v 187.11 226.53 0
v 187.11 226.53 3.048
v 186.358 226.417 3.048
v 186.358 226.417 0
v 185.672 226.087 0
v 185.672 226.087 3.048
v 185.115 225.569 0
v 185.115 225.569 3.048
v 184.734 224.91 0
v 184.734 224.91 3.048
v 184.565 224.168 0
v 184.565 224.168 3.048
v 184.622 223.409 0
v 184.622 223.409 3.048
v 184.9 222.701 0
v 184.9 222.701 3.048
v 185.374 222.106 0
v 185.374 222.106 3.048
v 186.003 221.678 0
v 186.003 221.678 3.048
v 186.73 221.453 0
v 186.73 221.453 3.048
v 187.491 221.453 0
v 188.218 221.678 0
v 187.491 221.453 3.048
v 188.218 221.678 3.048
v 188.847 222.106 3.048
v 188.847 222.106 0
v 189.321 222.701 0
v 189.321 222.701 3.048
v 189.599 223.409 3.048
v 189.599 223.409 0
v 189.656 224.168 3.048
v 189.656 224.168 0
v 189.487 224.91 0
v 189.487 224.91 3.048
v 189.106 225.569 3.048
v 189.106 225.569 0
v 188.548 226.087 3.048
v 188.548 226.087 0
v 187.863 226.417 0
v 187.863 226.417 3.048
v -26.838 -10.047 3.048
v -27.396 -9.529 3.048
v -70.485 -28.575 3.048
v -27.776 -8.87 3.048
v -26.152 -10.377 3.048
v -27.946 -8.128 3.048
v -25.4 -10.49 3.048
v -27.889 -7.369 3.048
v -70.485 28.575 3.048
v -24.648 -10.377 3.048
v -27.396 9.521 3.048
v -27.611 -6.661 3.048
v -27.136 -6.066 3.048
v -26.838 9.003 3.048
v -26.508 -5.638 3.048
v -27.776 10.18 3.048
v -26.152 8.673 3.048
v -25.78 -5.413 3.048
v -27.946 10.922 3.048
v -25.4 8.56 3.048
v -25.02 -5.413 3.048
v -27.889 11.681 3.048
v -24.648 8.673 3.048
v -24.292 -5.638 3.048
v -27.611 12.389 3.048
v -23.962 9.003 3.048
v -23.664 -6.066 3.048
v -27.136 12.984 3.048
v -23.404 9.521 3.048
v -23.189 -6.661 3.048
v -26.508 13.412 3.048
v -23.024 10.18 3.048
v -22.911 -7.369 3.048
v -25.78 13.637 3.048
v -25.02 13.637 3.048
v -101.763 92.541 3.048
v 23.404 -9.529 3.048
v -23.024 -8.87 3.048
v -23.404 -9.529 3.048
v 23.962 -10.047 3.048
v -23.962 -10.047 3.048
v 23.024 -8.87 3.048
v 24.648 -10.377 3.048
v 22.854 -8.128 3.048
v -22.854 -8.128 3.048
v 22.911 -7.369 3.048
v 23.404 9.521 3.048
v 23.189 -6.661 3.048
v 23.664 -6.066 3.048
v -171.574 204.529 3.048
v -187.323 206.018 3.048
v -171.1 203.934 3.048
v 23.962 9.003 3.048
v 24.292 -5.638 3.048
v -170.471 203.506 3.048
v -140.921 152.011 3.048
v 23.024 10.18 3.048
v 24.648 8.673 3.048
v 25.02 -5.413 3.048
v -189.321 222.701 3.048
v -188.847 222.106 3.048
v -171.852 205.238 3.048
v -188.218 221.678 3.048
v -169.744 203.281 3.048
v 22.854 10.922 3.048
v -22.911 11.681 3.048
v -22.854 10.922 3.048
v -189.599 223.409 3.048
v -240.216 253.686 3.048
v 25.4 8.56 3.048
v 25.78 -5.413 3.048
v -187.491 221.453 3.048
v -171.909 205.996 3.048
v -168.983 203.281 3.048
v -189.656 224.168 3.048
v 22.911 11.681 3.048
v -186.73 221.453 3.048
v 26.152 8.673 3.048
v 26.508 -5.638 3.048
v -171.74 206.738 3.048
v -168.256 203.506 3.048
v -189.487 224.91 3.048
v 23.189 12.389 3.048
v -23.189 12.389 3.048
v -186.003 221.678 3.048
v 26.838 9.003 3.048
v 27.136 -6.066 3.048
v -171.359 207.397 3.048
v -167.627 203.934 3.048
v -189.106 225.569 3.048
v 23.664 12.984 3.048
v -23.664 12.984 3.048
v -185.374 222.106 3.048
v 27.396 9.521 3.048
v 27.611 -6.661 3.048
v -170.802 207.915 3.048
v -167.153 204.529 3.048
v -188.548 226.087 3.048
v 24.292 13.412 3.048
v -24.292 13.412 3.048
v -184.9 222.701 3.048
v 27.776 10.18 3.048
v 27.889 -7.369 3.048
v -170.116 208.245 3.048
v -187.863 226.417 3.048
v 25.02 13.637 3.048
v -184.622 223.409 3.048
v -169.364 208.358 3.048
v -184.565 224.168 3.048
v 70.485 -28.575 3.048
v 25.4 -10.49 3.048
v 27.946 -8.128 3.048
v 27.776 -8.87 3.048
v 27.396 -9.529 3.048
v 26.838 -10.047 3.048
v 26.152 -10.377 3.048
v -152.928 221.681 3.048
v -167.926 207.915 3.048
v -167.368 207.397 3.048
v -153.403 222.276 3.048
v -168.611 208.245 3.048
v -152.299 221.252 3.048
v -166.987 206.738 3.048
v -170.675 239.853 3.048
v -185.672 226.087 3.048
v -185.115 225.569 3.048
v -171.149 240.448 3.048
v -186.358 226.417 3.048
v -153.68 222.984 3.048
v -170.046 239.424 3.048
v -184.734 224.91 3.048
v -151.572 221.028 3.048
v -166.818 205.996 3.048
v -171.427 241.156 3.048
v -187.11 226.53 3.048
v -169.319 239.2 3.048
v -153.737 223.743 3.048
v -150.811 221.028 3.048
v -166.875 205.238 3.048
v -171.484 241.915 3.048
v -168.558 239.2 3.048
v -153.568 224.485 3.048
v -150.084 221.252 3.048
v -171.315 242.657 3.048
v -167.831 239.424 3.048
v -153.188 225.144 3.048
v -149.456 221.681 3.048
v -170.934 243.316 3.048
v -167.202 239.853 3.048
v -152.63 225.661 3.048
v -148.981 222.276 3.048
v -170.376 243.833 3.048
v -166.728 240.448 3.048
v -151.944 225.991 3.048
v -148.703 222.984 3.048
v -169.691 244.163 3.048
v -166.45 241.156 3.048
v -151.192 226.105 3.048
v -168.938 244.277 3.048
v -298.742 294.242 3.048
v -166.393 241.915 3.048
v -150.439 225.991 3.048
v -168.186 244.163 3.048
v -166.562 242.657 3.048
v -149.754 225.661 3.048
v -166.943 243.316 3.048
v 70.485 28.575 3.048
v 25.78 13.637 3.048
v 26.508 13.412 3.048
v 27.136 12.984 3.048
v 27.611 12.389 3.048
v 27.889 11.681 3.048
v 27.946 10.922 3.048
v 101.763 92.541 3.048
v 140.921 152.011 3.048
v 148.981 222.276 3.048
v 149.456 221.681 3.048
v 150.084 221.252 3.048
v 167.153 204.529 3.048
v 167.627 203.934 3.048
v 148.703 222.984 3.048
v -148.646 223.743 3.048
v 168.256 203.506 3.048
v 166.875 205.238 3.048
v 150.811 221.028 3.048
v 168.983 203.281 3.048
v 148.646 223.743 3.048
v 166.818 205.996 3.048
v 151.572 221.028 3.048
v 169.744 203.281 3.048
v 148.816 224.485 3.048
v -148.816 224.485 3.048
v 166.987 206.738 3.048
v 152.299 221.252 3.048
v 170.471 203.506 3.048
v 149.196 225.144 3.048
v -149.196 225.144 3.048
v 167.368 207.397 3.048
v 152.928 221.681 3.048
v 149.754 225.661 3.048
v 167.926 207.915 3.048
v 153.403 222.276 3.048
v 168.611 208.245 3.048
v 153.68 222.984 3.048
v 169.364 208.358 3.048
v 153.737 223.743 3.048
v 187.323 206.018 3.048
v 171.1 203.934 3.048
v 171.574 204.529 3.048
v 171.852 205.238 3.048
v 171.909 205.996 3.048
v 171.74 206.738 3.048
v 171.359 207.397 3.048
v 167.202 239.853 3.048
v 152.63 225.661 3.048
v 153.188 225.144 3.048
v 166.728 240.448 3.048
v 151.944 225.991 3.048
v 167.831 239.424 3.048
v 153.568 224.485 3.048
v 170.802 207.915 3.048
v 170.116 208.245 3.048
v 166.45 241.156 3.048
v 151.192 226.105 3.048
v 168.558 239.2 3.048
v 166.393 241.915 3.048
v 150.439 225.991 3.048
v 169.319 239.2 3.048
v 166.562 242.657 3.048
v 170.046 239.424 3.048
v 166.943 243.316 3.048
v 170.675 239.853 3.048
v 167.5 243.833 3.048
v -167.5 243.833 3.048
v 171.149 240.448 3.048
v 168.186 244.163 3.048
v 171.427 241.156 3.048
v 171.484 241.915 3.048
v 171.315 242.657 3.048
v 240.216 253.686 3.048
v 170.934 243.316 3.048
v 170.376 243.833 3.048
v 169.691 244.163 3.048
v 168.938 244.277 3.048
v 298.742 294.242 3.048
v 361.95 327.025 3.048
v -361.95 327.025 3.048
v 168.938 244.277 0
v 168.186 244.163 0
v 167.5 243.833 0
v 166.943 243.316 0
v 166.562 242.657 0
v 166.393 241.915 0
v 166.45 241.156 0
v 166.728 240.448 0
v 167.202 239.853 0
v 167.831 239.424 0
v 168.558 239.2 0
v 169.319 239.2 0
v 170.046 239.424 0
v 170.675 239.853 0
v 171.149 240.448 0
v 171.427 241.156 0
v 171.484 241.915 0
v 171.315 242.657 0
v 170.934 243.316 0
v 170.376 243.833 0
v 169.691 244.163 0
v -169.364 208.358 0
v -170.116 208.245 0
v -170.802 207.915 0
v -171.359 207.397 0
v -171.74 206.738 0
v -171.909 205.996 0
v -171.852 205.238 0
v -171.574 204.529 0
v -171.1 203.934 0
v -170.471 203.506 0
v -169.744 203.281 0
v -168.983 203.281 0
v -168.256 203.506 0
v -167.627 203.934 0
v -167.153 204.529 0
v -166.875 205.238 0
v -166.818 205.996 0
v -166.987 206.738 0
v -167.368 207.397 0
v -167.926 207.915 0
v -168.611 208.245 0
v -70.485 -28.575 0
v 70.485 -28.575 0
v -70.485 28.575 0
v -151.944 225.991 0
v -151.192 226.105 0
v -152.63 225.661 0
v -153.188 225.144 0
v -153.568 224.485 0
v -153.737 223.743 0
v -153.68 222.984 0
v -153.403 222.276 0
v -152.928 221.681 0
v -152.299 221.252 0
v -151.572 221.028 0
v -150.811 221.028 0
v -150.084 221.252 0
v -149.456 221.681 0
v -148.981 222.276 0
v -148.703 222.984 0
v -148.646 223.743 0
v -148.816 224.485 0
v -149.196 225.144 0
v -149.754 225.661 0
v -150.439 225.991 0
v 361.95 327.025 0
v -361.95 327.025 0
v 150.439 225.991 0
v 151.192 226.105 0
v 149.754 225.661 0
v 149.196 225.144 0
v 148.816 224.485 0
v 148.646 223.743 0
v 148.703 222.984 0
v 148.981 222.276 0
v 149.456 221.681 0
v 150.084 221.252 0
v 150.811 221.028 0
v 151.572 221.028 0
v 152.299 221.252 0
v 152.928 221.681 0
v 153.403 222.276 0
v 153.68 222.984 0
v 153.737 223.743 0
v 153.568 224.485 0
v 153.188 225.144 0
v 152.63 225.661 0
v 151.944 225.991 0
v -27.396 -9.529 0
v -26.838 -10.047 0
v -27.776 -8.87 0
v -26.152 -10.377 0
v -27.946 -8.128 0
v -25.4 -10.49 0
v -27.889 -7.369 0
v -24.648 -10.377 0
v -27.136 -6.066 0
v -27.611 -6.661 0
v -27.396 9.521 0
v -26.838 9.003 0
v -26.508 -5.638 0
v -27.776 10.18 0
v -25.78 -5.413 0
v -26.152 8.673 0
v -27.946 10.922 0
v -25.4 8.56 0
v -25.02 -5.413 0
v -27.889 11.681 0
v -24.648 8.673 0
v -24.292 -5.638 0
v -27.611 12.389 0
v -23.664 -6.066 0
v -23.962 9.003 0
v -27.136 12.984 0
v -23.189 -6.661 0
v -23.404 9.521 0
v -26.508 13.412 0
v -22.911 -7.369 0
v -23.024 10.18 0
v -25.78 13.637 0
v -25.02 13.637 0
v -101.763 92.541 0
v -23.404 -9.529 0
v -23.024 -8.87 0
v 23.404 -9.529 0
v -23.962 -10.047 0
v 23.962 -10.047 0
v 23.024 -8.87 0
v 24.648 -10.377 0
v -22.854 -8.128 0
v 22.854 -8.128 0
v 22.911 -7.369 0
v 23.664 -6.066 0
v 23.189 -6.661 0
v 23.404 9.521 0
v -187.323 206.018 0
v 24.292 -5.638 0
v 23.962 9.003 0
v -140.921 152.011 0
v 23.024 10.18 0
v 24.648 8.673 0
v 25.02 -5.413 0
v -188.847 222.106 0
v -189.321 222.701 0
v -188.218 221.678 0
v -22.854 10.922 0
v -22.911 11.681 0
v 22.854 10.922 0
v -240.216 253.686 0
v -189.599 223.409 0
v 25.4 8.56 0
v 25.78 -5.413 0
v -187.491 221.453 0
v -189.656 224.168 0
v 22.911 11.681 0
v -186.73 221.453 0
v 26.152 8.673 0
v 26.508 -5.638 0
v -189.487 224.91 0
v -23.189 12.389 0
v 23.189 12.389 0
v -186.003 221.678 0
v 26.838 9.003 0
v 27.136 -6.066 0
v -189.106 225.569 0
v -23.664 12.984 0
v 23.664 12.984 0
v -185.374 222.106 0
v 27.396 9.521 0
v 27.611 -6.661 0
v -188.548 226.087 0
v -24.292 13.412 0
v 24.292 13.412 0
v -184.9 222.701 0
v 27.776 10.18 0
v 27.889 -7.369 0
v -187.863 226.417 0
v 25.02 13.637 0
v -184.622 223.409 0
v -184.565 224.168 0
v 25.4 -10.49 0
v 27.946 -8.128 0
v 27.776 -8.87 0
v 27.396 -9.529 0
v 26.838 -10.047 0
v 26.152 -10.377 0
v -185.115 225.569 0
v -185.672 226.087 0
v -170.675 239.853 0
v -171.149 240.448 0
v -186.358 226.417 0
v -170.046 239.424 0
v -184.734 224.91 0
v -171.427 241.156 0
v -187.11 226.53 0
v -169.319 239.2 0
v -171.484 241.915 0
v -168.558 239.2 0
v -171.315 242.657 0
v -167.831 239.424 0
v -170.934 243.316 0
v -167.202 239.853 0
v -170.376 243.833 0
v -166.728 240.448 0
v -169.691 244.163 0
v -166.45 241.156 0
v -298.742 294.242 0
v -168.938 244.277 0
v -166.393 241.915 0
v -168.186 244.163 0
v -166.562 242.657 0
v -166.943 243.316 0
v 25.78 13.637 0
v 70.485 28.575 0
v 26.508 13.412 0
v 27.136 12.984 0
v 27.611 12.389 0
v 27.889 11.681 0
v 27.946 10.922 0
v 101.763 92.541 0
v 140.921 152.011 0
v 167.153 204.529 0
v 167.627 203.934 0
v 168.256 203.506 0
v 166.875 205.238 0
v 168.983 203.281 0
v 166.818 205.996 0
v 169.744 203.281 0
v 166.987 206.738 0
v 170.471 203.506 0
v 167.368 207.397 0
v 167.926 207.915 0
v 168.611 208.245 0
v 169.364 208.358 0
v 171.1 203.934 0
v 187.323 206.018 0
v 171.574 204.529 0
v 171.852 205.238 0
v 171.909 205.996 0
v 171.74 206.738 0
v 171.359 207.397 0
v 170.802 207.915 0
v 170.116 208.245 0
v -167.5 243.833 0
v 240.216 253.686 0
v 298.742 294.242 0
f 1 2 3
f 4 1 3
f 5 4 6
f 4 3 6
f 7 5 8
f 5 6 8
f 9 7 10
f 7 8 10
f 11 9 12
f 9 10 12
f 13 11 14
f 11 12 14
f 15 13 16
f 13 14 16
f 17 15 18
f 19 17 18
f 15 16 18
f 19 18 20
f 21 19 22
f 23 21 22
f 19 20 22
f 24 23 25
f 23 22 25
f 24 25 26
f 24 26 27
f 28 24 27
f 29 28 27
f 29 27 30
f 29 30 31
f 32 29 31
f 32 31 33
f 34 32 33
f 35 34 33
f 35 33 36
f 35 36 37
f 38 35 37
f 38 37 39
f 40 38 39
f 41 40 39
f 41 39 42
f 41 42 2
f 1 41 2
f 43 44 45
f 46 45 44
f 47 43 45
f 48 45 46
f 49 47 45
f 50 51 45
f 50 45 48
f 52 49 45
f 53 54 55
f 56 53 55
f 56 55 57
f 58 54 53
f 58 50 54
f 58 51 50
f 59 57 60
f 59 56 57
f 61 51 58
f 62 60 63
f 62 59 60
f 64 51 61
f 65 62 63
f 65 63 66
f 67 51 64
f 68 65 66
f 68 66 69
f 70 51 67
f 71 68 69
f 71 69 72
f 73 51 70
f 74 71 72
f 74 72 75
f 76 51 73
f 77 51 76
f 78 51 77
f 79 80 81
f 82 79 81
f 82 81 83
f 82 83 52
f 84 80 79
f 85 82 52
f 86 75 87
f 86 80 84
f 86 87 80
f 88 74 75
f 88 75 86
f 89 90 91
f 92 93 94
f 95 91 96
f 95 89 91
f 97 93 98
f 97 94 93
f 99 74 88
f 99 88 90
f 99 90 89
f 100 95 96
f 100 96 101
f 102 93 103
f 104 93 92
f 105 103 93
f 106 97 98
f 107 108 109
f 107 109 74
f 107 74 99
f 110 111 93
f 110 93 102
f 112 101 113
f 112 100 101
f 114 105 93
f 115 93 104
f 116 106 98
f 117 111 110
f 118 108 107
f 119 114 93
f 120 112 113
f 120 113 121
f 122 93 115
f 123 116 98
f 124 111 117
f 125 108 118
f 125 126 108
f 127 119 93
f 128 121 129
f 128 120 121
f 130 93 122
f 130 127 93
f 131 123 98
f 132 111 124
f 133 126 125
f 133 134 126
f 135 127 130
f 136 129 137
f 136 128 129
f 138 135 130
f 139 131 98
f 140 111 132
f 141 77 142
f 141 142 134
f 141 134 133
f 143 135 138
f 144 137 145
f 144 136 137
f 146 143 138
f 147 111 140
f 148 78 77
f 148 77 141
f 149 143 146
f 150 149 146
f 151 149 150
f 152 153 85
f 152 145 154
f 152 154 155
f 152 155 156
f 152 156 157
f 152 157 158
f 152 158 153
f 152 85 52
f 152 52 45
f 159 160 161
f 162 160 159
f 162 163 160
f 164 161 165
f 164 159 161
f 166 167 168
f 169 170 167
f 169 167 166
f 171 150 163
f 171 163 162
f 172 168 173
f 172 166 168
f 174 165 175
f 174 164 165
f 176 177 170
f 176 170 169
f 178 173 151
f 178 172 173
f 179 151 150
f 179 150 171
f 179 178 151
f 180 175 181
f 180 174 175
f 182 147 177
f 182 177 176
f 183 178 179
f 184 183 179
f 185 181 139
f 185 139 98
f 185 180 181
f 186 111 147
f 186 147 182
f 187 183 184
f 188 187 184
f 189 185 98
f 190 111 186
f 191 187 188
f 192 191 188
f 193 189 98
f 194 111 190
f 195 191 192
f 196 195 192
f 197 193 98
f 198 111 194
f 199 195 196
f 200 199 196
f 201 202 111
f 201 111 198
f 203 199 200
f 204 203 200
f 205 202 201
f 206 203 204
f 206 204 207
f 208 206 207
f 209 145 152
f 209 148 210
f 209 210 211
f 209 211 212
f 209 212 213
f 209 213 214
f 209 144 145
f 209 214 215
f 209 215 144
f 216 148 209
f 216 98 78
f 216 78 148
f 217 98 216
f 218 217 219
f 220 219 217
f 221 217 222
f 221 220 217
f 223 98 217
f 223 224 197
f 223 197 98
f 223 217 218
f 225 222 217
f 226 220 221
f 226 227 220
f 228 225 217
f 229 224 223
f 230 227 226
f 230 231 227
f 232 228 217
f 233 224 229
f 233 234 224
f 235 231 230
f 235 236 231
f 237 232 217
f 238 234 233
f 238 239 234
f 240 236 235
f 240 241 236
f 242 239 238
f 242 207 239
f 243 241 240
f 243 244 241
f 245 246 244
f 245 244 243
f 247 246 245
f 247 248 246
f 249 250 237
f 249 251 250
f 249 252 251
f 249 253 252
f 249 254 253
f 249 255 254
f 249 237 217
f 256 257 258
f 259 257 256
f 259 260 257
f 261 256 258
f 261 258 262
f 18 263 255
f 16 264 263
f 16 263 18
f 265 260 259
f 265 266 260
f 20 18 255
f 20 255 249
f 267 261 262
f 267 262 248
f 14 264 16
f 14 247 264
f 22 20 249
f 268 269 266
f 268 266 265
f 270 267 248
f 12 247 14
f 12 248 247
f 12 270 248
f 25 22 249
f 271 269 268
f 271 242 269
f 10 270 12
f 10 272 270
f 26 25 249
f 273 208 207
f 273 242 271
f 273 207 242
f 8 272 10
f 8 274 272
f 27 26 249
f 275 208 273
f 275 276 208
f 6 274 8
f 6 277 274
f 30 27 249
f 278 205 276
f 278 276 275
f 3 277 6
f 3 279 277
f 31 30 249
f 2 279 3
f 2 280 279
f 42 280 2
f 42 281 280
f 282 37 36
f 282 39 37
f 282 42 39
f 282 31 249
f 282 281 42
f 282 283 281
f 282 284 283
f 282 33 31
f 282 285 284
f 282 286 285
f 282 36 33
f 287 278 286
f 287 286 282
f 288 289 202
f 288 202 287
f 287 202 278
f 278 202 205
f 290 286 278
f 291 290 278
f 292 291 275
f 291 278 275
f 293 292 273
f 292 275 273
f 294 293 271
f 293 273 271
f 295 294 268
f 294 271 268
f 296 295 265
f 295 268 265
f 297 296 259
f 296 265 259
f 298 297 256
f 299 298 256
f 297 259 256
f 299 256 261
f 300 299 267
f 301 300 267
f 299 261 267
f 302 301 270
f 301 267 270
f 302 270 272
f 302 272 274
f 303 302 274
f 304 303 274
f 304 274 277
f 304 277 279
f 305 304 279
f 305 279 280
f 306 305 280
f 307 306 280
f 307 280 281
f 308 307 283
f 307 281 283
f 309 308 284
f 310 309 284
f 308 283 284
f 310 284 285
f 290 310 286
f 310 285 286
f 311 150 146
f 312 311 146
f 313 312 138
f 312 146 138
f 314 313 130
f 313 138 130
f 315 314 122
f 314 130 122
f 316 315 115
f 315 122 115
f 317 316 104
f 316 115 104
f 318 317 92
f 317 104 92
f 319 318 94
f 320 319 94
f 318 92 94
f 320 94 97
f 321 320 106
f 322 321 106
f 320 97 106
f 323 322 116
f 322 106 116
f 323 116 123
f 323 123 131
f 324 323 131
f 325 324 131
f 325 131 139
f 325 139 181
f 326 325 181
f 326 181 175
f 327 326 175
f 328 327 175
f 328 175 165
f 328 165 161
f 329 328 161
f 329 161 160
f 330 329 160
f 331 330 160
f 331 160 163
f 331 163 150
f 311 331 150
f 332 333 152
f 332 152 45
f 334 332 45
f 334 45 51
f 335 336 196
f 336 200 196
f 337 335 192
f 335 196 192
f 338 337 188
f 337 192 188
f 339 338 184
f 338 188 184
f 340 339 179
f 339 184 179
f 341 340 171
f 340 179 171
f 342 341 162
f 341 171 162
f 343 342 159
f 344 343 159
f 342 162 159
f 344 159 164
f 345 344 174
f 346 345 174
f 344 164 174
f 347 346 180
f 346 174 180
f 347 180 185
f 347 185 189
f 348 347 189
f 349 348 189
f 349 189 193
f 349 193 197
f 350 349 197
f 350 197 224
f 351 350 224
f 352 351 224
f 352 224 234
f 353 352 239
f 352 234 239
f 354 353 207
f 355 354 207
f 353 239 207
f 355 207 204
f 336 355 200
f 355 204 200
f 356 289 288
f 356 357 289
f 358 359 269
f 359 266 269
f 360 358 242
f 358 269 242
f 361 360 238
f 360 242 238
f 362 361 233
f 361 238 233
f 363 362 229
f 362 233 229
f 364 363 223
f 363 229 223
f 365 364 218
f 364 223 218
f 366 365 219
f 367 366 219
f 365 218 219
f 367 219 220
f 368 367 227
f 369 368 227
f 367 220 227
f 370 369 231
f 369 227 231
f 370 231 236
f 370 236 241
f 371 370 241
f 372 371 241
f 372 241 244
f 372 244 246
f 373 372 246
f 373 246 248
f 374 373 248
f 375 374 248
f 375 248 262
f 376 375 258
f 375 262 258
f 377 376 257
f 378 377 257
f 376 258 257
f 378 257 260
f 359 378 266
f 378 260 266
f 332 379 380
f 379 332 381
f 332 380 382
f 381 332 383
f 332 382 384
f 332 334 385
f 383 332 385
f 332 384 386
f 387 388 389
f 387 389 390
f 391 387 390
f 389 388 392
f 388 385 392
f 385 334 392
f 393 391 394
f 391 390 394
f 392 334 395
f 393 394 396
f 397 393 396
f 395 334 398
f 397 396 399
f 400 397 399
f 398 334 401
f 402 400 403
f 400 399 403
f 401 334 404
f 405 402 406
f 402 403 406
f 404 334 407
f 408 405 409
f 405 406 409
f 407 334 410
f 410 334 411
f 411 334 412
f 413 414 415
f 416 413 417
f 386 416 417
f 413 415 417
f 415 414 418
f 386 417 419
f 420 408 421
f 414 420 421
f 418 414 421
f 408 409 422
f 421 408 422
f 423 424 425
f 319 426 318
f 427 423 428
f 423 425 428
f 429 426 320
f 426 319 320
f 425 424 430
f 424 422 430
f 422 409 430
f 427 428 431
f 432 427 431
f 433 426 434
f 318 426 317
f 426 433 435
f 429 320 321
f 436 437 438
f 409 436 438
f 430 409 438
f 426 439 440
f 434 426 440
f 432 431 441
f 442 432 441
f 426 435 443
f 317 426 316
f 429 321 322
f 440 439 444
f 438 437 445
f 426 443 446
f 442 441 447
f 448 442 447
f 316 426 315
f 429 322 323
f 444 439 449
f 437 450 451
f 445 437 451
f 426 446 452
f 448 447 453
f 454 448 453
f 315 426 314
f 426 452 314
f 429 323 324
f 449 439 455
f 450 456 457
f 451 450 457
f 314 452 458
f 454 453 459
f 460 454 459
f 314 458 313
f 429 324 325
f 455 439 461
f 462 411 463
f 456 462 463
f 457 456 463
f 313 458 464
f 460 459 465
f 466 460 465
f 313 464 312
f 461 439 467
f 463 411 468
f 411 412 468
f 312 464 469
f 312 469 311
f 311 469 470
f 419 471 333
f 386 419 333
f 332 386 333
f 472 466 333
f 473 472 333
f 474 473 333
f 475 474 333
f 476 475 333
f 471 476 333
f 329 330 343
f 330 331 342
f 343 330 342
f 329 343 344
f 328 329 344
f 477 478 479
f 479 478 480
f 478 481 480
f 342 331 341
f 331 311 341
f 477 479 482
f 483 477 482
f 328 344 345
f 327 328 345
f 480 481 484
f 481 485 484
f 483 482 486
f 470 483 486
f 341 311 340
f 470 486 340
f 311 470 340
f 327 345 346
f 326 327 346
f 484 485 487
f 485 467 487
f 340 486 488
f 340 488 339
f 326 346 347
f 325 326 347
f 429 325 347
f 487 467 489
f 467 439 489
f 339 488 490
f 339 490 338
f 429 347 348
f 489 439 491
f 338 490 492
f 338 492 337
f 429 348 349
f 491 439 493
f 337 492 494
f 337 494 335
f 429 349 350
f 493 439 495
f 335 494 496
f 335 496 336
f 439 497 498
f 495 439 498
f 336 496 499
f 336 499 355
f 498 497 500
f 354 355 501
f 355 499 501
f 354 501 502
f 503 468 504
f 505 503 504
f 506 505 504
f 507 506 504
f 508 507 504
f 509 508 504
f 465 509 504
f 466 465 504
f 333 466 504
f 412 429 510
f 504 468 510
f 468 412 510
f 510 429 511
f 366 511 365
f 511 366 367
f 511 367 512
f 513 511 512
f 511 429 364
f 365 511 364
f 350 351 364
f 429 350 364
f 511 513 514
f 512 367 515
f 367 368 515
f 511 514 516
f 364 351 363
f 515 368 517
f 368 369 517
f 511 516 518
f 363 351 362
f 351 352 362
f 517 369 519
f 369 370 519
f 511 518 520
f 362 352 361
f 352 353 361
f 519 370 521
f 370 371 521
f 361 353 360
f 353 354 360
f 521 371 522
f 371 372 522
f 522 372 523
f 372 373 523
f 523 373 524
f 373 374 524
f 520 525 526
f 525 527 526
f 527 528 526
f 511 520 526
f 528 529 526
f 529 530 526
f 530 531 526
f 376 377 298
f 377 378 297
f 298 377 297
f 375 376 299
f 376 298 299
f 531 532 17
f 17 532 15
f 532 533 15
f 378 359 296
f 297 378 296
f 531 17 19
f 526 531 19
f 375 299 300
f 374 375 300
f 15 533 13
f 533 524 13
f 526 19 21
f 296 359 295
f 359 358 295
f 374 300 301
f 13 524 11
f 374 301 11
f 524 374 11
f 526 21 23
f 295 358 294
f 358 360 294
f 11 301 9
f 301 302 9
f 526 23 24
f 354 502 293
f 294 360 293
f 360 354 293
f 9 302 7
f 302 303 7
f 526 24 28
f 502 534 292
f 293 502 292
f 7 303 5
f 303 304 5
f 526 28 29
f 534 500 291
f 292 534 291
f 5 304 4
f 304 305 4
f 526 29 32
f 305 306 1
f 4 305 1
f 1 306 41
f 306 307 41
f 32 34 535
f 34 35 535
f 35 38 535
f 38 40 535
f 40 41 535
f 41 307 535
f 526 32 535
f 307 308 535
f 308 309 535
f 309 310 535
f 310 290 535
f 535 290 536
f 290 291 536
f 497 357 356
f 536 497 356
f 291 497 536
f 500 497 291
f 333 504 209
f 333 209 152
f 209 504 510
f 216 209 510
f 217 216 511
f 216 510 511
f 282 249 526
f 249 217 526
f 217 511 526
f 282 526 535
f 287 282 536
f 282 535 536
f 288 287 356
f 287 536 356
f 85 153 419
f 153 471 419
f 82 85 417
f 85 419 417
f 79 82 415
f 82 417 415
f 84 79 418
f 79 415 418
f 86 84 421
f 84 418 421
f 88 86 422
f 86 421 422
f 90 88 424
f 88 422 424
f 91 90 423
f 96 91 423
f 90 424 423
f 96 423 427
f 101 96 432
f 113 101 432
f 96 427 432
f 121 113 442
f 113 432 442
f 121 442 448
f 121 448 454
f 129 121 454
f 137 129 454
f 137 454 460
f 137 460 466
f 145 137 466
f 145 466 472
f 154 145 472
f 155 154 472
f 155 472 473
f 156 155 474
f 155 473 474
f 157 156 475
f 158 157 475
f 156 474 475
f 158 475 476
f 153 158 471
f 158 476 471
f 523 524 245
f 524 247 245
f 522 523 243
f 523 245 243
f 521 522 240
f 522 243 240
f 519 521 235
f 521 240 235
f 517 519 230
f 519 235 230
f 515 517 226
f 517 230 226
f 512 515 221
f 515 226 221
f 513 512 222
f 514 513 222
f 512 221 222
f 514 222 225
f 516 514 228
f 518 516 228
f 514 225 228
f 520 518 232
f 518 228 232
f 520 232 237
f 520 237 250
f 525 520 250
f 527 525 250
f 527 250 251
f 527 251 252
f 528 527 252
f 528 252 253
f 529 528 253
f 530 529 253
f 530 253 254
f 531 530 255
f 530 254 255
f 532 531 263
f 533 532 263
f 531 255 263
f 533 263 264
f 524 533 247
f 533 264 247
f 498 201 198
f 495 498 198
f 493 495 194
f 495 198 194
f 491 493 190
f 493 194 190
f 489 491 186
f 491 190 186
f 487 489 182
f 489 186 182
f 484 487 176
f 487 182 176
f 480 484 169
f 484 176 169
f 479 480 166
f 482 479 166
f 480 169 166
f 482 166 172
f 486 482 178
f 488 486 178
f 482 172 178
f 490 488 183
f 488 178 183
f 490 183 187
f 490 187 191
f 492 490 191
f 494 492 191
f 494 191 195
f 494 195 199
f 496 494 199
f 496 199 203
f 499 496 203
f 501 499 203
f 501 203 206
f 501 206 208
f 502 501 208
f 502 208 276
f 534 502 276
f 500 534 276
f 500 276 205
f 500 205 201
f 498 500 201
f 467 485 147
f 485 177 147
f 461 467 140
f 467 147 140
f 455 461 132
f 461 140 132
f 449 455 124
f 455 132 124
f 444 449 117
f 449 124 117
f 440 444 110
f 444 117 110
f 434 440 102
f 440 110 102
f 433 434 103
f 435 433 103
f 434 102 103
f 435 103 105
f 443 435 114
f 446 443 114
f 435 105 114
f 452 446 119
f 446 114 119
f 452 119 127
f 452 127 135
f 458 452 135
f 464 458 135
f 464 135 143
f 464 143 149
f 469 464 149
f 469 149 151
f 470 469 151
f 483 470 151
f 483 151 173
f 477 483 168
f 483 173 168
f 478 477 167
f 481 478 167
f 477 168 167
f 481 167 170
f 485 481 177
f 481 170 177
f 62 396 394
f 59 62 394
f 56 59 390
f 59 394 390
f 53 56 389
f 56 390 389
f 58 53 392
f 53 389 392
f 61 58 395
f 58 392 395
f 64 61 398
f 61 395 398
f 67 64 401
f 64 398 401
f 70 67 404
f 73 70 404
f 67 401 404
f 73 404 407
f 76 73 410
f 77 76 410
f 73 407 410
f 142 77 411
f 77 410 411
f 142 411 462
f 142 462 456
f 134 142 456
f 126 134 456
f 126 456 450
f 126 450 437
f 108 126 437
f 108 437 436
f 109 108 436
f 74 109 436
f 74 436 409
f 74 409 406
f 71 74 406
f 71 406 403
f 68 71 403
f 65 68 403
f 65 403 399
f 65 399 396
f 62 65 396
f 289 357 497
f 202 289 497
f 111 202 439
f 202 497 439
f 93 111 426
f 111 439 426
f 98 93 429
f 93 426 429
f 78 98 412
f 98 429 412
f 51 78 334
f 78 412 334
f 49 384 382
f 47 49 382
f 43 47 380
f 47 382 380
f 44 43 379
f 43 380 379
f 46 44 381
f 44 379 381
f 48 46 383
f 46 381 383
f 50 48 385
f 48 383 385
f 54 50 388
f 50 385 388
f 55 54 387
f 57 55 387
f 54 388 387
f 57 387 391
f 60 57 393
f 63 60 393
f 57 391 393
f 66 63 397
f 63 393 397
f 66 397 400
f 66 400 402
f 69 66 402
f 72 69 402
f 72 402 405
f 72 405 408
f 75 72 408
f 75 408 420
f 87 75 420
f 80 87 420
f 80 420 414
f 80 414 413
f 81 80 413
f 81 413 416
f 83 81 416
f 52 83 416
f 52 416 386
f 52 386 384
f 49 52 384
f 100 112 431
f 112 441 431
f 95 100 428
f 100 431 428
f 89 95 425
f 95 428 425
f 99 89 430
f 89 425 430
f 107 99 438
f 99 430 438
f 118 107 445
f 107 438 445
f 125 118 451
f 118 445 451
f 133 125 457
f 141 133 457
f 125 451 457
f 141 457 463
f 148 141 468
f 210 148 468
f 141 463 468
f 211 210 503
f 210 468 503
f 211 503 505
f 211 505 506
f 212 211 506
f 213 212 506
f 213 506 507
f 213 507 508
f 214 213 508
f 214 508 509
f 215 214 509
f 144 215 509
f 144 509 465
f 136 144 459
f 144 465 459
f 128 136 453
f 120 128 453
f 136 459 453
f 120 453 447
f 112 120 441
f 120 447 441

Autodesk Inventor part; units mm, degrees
ref_plane "YZ Plane" through (0, 0, 0) normal (1, 0, 0) x (0, 1, 0)
ref_plane "XZ Plane" through (0, 0, 0) normal (0, 1, 0) x (-1, 0, 0)
ref_plane "XY Plane" through (0, 0, 0) normal (0, 0, 1) x (1, 0, 0)
sketch "Sketch1" plane through (0, 0, 0) normal (0, 0, 1) x (1, 0, 0)
  line L0 (70.485, -28.575) -> (-70.485, -28.575)
  line L1 (-70.485, -28.575) -> (-70.485, 28.575)
  line L2 (-70.485, 28.575) -> (70.485, 28.575)
  line L3 (70.485, 28.575) -> (70.485, -28.575)
  line L4 (70.485, -28.575) -> (-70.485, 28.575) construction
  line L5 (-70.485, -28.575) -> (70.485, 28.575) construction
  line L6 (-361.95, 327.025) -> (361.95, 327.025)
  line L7 (-361.95, 327.025) -> (-361.95, 352.425) construction
  line L8 (-70.485, 28.575) -> (-45.085, 28.575) construction
  line L9 (0, 0) -> (0, 28.575) construction
  arc A0 (-70.485, 28.575) -> (-361.95, 327.025) centre (-587.1049, -184.407) ccw
  arc A1 (361.95, 327.025) -> (70.485, 28.575) centre (587.1049, -184.407) ccw
  point P0 (0, 327.025)
  dimension "d0" = 140.97
  dimension "d1" = 57.15
  dimension "d2" = 723.9
  dimension "d3" = 355.6
  dimension "d4" = 25.4
  dimension "d7" = 558.8
extrude "Plate1" add sketch "Sketch1" along normal blind 3.048
sketch "Sketch2" plane through (0, 0, 3.048) normal (0, 0, 1) x (1, 0, 0)
  line L0 (70.485, -28.575) -> (-70.485, -28.575) construction
  line L1 (-25.4, -28.575) -> (-25.4, -7.9375) construction
  point P0 (0, 0)
  point P1 (25.4, -7.9375)
  point P2 (-25.4, 11.1125)
  point P3 (25.4, 11.1125)
  dimension "d9" = 20.6375
  dimension "d11" = 25.4
  dimension "d15" = 50.8
  dimension "d18" = 19.05
hole "Hole1" at (-25.4, -7.9375, 3.048) at (25.4, -7.9375, 3.048) at (-25.4, 11.1125, 3.048) at (25.4, 11.1125, 3.048) direction (0, 0, -1) diameter 5.1054 depth 3.048 tip angle 118 clearance for "Flat Head Machine Screw (82)" size "#10" standard "Ansi Unified Screw Threads"
sketch "Sketch3" plane through (0, 0, 0) normal (0, 0, -1) x (-1, 0, 0)
  arc A0 (361.95, 327.025) -> (70.485, 28.575) centre (587.1049, -184.407) ccw construction
  line L0 (187.323, 206.0182) -> (178.2371, 214.8915) construction
  line L1 (169.3637, 205.8056) -> (187.1104, 223.9775) construction
  line L2 (169.3637, 205.8056) -> (151.1918, 223.5522) construction
  line L3 (187.1104, 223.9775) -> (168.9384, 241.7241) construction
  line L4 (0, 0) -> (0, 25.4) construction
  point P0 (-169.3637, 205.8056)
  point P1 (-187.1104, 223.9775)
  point P2 (-151.1918, 223.5522)
  point P3 (-168.9384, 241.7241)
  dimension "d28" = 12.7
  dimension "d29" = 25.4
  dimension "d30" = 25.4
  dimension "d31" = 25.4
  dimension "d32" = 25.4
hole "Hole2" at (-169.3637, 205.8056, 0) at (-187.1104, 223.9775, 0) at (-151.1918, 223.5522, 0) at (-168.9384, 241.7241, 0) at (151.1918, 223.5522, 0) at (169.3637, 205.8056, 0) at (187.1104, 223.9775, 0) at (168.9384, 241.7241, 0) direction (0, 0, 1) diameter 5.1054 depth 3.048 tip angle 118 clearance for "Flat Head Machine Screw (82)" size "#10" standard "Ansi Unified Screw Threads"
sketch "Sketch4" plane through (0, 0, 0) normal (0, 0, -1) x (-1, 0, 0)
  point P0 (0, 0)
equation "\"d26\" = Thickness"
equation "\"d38\" = Thickness"
equation "\"d8\" = Thickness"
equation "\"BendRadius\" = Thickness"
equation "\"BendReliefWidth\" = Thickness"
equation "\"BendReliefDepth\" = 0.5 * Thickness"
equation "\"CornerReliefSize\" = 4 * Thickness"
equation "\"MinimumRemnant\" = 2 * Thickness"
equation "\"TransitionRadius\" = BendRadius"
equation "\"JacobiRadiusSize\" = BendRadius"
equation "\"GapSize\" = Thickness"
equation "\"Thickness\" = 3.048"
properties part number "curved_hopper_back" material "Polycarbonate, Clear"
